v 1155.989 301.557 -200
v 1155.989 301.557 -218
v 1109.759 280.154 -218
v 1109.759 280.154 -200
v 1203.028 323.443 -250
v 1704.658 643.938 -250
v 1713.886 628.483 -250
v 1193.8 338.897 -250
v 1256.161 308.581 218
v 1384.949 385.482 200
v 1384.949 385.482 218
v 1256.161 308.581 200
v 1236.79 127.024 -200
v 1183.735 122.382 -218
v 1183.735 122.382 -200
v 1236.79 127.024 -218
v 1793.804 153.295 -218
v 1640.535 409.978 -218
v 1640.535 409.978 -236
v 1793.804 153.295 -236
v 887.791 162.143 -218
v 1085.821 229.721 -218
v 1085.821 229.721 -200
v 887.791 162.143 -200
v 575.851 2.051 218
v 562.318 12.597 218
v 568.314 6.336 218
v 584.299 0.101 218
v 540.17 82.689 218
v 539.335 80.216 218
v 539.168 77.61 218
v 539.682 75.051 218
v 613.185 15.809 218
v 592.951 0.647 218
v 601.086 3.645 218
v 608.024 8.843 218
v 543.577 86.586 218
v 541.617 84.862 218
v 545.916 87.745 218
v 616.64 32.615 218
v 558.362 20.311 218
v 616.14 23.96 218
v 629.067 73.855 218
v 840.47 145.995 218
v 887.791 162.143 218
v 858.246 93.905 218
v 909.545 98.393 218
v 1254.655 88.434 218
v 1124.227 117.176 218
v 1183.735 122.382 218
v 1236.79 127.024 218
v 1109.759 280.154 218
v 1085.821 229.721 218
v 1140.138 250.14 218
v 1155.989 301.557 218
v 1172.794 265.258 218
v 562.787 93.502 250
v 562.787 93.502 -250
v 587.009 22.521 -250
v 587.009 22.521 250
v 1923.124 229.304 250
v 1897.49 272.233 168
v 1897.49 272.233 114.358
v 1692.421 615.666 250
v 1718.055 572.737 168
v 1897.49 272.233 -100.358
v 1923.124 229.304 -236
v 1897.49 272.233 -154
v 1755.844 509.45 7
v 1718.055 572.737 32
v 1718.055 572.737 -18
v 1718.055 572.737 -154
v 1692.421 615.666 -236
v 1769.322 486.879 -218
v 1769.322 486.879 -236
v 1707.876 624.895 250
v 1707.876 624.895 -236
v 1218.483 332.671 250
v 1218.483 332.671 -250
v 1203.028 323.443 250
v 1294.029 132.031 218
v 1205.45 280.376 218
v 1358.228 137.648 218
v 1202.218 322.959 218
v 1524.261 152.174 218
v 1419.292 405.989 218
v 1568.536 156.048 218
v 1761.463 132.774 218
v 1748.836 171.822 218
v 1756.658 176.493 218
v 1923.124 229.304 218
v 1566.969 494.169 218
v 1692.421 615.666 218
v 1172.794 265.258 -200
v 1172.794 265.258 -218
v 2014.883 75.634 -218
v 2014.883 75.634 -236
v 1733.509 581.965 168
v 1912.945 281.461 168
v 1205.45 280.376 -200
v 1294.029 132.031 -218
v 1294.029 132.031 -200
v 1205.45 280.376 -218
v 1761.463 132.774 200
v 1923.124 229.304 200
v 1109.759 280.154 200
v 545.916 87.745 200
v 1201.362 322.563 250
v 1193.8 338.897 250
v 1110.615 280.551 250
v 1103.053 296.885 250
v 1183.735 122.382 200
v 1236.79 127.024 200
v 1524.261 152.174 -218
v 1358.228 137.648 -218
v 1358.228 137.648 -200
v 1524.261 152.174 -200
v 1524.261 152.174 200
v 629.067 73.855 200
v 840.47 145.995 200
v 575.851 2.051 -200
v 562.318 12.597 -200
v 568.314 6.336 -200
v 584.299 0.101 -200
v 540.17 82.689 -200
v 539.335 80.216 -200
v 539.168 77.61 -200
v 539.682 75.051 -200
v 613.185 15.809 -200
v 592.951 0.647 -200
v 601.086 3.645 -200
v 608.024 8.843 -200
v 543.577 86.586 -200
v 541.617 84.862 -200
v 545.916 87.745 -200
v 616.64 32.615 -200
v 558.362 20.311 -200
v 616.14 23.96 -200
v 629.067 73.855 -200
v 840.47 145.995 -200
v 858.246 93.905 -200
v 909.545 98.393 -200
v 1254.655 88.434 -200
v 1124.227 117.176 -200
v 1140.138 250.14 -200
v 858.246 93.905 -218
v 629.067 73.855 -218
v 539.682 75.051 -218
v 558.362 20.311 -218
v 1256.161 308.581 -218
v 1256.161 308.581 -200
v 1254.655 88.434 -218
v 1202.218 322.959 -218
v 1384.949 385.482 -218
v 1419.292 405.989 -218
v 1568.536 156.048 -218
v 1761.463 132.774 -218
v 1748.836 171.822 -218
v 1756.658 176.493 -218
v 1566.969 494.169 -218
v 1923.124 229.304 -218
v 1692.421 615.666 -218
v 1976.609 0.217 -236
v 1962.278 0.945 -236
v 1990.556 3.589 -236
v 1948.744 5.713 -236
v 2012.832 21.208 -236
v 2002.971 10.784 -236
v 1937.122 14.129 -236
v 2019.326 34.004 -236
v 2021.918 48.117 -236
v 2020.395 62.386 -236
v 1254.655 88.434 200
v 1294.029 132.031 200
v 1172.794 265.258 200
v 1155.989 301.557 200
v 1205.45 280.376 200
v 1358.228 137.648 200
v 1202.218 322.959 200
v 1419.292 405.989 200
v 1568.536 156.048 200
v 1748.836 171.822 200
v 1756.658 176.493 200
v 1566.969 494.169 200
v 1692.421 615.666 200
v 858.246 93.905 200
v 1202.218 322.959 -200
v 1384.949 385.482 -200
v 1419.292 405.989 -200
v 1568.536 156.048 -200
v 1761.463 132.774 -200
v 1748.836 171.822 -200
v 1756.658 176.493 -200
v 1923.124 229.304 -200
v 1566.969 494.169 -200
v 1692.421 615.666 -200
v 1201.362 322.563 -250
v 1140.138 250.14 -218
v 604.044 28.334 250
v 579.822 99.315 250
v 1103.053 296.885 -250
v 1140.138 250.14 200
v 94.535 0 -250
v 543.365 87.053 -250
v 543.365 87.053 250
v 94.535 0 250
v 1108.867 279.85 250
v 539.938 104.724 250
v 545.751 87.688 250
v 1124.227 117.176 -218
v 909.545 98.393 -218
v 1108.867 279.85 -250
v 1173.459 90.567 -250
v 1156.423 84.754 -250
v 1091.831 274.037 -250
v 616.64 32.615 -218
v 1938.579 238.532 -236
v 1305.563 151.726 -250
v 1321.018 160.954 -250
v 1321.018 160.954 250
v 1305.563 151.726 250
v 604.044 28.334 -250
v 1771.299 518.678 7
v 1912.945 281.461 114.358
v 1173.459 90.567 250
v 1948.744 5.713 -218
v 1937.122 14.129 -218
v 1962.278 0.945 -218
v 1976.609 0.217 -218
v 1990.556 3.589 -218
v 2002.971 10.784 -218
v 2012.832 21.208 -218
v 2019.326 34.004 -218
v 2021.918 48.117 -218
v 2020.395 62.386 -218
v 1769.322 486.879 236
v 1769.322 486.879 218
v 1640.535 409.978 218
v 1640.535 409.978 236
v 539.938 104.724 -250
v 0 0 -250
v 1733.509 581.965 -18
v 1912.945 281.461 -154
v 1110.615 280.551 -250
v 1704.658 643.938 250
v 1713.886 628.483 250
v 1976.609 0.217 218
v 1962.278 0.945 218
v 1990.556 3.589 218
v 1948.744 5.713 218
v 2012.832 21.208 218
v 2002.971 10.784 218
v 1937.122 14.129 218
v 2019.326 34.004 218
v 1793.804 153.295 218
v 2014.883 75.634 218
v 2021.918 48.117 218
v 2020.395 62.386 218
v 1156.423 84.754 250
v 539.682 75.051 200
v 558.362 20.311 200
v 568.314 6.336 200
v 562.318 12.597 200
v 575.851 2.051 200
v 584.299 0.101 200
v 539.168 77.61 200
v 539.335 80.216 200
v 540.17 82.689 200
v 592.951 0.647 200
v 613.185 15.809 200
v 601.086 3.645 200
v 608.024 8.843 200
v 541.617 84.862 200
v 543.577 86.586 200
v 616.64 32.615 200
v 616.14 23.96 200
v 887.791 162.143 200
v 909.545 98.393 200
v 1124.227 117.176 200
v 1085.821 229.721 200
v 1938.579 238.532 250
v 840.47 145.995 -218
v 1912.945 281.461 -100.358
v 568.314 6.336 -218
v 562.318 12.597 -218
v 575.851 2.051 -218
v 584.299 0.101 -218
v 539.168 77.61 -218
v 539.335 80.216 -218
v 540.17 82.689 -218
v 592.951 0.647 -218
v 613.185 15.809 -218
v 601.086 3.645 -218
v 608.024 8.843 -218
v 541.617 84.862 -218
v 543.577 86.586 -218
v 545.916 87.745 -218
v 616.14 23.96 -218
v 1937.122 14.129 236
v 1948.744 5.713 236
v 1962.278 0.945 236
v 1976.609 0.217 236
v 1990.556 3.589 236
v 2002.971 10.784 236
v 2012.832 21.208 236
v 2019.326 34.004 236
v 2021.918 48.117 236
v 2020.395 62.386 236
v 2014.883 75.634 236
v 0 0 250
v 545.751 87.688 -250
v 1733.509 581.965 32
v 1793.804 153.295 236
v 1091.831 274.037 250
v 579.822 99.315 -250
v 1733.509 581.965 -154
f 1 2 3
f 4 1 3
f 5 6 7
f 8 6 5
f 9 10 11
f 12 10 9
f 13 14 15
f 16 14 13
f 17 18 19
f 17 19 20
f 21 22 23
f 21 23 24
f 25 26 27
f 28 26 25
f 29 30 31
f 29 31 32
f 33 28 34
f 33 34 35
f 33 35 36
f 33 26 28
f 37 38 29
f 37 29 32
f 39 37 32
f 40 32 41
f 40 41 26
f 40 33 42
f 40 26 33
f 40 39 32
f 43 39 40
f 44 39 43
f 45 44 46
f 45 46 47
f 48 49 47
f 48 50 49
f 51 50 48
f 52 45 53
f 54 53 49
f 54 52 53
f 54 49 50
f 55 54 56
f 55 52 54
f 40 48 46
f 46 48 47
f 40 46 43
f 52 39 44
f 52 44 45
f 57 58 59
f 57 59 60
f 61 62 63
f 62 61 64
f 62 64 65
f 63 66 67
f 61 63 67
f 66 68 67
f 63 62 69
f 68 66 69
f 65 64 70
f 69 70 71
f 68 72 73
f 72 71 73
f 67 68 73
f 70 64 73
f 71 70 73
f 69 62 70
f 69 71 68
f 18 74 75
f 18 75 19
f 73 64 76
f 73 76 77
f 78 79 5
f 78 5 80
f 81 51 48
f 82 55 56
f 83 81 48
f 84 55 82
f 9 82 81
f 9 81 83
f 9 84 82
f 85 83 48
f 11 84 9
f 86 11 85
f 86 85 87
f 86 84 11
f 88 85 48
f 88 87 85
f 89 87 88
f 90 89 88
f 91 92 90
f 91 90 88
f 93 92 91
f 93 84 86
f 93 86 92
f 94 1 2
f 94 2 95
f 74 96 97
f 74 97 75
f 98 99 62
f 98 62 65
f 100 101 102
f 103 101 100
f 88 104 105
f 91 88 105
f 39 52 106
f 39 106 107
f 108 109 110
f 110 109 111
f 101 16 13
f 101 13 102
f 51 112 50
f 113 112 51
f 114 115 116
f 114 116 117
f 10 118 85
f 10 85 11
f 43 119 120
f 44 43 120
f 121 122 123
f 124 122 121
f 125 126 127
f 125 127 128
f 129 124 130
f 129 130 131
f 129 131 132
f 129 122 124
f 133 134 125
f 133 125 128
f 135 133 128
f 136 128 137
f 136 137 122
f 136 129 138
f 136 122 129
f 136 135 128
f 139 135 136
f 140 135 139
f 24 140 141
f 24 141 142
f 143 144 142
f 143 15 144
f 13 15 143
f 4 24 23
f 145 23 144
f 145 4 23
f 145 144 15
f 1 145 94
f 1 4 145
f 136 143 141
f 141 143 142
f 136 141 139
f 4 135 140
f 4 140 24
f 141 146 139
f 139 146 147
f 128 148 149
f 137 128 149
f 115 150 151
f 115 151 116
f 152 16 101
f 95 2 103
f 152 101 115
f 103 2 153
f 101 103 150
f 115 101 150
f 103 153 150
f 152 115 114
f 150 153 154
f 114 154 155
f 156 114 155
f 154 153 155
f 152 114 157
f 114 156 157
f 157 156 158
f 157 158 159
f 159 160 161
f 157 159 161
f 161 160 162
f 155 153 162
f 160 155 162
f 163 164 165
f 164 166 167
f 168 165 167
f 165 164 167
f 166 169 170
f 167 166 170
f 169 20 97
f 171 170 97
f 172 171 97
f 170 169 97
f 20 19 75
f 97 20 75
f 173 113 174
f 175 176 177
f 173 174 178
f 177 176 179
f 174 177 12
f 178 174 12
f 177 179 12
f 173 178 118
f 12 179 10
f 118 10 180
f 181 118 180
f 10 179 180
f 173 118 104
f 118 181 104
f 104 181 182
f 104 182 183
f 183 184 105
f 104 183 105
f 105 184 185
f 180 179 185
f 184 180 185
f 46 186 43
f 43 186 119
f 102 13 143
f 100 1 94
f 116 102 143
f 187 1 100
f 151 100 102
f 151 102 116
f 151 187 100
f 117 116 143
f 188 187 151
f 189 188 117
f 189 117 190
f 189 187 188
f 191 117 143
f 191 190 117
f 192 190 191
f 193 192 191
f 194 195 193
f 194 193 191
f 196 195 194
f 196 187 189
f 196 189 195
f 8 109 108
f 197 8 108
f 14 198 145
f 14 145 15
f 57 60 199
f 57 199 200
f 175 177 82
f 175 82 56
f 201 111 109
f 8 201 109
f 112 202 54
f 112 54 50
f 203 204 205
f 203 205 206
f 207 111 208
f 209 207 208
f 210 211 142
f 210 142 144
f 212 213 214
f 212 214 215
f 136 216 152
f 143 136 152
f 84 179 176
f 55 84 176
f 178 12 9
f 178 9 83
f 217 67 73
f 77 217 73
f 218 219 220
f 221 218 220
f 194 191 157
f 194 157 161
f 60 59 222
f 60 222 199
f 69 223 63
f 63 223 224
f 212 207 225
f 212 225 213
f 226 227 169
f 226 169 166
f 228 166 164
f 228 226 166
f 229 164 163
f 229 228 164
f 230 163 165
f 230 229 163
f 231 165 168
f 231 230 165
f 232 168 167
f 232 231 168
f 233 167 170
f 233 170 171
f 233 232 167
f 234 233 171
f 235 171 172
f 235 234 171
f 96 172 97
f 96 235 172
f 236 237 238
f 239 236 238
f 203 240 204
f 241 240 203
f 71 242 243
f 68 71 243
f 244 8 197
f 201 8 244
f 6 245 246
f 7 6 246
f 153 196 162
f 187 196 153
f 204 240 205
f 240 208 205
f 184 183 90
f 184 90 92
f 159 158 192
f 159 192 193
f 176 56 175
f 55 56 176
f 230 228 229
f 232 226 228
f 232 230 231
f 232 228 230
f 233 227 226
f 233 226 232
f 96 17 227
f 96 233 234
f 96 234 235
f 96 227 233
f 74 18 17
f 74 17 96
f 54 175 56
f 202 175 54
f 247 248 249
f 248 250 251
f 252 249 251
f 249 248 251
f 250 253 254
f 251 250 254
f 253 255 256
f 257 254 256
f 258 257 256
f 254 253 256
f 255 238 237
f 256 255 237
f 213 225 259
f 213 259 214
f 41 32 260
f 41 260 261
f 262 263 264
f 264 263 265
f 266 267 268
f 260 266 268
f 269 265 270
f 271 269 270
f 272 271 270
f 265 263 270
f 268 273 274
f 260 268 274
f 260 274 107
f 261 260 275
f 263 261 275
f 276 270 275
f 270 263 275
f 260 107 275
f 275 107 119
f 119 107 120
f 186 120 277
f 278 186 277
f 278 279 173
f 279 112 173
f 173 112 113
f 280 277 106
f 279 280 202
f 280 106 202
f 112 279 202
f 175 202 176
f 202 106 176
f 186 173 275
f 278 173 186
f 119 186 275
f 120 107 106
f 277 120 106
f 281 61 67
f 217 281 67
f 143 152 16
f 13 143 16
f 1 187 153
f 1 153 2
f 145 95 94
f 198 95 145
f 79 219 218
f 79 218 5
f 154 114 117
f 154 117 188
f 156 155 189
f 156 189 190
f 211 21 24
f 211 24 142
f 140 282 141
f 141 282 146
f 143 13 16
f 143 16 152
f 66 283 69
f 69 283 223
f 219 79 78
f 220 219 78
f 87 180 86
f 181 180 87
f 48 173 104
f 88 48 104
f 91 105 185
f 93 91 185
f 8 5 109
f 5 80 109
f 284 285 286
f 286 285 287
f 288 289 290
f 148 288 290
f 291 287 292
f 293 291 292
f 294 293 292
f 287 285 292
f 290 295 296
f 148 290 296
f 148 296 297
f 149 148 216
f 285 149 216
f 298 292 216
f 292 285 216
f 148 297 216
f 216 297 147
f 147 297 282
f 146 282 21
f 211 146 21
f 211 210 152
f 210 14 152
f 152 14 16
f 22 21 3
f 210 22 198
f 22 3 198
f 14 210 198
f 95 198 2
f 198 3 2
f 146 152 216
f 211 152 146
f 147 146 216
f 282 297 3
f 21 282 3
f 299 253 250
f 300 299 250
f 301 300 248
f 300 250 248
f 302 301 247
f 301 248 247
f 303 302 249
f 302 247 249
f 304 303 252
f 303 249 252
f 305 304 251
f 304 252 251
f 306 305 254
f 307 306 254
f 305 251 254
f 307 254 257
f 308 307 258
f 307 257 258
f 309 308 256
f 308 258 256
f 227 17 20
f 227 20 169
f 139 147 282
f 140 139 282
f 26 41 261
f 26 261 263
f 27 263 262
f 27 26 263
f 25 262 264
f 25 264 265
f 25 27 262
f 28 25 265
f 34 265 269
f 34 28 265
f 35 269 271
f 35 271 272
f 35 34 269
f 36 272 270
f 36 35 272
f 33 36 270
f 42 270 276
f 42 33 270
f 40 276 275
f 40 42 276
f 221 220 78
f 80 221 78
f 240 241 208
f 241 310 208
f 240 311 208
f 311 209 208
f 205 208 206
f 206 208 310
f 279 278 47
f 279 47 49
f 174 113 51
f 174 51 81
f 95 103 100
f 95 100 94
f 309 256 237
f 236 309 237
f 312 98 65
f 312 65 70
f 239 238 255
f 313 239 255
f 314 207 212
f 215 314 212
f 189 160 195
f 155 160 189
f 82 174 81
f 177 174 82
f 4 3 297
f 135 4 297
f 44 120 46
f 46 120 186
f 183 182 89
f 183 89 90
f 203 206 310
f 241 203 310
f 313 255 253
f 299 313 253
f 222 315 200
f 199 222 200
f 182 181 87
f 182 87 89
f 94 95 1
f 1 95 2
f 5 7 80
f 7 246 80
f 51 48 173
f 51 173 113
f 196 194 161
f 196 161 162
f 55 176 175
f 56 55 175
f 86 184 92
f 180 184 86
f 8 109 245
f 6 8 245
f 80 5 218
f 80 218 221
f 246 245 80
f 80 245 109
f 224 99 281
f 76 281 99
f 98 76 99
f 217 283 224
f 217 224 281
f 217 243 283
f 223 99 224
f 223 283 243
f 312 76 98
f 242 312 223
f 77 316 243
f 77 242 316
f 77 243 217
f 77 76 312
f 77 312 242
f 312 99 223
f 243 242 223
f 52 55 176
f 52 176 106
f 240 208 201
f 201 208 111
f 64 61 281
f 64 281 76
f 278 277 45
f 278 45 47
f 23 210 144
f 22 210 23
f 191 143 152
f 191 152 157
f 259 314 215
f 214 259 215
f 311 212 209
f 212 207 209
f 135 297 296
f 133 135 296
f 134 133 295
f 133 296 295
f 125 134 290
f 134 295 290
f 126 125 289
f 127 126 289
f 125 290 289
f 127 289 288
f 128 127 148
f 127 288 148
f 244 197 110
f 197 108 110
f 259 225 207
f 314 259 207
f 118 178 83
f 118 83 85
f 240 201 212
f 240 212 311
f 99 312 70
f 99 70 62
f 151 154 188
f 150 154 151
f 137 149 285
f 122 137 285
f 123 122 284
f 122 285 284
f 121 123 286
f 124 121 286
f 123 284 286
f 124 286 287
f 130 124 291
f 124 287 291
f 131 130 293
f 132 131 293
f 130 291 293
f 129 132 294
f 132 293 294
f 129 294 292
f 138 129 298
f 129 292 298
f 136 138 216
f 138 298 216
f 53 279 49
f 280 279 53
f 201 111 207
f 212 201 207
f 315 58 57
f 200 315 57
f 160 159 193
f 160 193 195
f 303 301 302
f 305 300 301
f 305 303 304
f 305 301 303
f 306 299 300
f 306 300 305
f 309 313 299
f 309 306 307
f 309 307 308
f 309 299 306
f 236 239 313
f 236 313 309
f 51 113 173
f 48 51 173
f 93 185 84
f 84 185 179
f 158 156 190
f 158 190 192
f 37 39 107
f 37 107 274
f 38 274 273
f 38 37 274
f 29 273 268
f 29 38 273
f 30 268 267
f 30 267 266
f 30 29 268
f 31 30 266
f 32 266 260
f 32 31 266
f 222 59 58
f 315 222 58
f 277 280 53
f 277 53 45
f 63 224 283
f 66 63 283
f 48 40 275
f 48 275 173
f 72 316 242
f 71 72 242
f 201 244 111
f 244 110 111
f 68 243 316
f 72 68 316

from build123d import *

# Parameters (mm, degrees)
BOSS_EXTRUDE1_DEPTH     = 250
BOSS_EXTRUDE1_2_DEPTH   = 250
BOSS_EXTRUDE1_3_DEPTH   = 250
BOSS_EXTRUDE1_4_DEPTH   = 250
BOSS_EXTRUDE2_START     = 200
BOSS_EXTRUDE2_DEPTH     = 18
BOSS_EXTRUDE8_START     = 218
BOSS_EXTRUDE8_DEPTH     = 18
BOSS_EXTRUDE3_DEPTH     = 18
SKETCH10_W              = 486
SKETCH10_H              = 450
BOSS_EXTRUDE4_DEPTH     = 18
SKETCH18_W              = 500
SKETCH18_H              = 200
BOSS_EXTRUDE9_DEPTH     = 18
SKETCH19_W              = 500
SKETCH19_H              = 200
BOSS_EXTRUDE10_DEPTH    = 18
SKETCH20_W              = 500
SKETCH20_H              = 75
BOSS_EXTRUDE11_DEPTH    = 18
CUT_EXTRUDE2_DEPTH      = 18
CUT_EXTRUDE3_DEPTH      = 2174.010915016
CUT_EXTRUDE3_DEPTH_BACK = 2174.010915016


with BuildPart() as part:
    # Sketch6 → Boss-Extrude1 (new, symmetric)
    with BuildSketch(Plane.XY):
        Polygon((94.53452545, 0), (0, 0), (539.937920842, 104.723644117), (543.365240104, 87.052948526), align=None)
    extrude(amount=BOSS_EXTRUDE1_DEPTH, both=True)


with BuildPart() as body_2:
    # Sketch6 → Boss-Extrude1 2 (new, symmetric)
    with BuildSketch(Plane.XY):
        Polygon((1103.053289344, 296.885247349), (1108.866581543, 279.849824436), (545.75121304, 87.688221205), (539.937920842, 104.723644117), align=None)
    extrude(amount=BOSS_EXTRUDE1_2_DEPTH, both=True)


with BuildPart() as body_3:
    # Sketch6 → Boss-Extrude1 3 (new, symmetric)
    with BuildSketch(Plane.XY):
        Polygon((1193.800214808, 338.897097092), (1201.362347762, 322.562650509), (1110.615422298, 280.550800765), (1103.053289344, 296.885247349), align=None)
    extrude(amount=BOSS_EXTRUDE1_3_DEPTH, both=True)


with BuildPart() as body_4:
    # Sketch6 → Boss-Extrude1 4 (new, symmetric)
    with BuildSketch(Plane.XY):
        Polygon((1704.657517606, 643.937776637), (1713.885639004, 628.483269998), (1203.028336206, 323.442590453), (1193.800214808, 338.897097092), align=None)
    extrude(amount=BOSS_EXTRUDE1_4_DEPTH, both=True)


with BuildPart() as body_5:
    # Sketch8 → Boss-Extrude2 (new body)
    with BuildSketch(Plane.XY.offset(BOSS_EXTRUDE2_START)):
        Polygon((1692.42104645, 615.666434723), (1202.218399833, 322.958965104), (1155.98888503, 301.556725637), (1254.655454355, 88.433812293), (1761.463497139, 132.773770621), (1923.1240814, 229.303768741), align=None)
    extrude(amount=BOSS_EXTRUDE2_DEPTH)


with BuildPart() as body_6:
    # Sketch17 → Boss-Extrude8 (new body)
    with BuildSketch(Plane.XY.offset(BOSS_EXTRUDE8_START)):
        with BuildLine():
            Line((1254.655454355, 88.433812293), (1155.98888503, 301.556725637))
            Line((1155.98888503, 301.556725637), (1109.759370227, 280.15448617))
            Line((1109.759370227, 280.15448617), (545.916310922, 87.744560412))
            ThreePointArc((545.916310922, 87.744560412), (540.170094701, 82.688905865), (539.681793859, 75.050829795))
            Line((539.681793859, 75.050829795), (558.36155207, 20.311179669))
            ThreePointArc((558.36155207, 20.311179669), (592.950825668, 0.647003481), (616.639764534, 32.614672282))
            Line((616.639764534, 32.614672282), (1254.655454355, 88.433812293))
        make_face()
    extrude(amount=-BOSS_EXTRUDE8_DEPTH)


with BuildPart() as body_7:
    # Sketch9 → Boss-Extrude3 (new body)
    with BuildSketch(Plane.XY.offset(218)):
        with BuildLine():
            Line((1769.3220581, 486.878879395), (1640.534502772, 409.977867745))
            Line((1640.534502772, 409.977867745), (1793.80385908, 153.294824416))
            Line((1793.80385908, 153.294824416), (1937.121726961, 14.128884896))
            ThreePointArc((1937.121726961, 14.128884896), (2002.971407437, 10.78394543), (2014.882838534, 75.63367055))
            Line((2014.882838534, 75.63367055), (1769.3220581, 486.878879395))
        make_face()
    extrude(amount=BOSS_EXTRUDE3_DEPTH)


with BuildPart() as body_8:
    # Mirror1: mirrored copy
    add(body_7.part.mirror(Plane.XY))


with BuildPart() as body_9:
    # Mirror1 2: mirrored copy
    add(body_5.part.mirror(Plane.XY))


with BuildPart() as body_10:
    # Mirror1 3: mirrored copy
    add(body_6.part.mirror(Plane.XY))


with BuildPart() as body_11:
    # Sketch10 → Boss-Extrude4 (new body)
    with BuildSketch(Plane(origin=(1518.594971798, 906.776196822, 0), x_dir=(0, 0, -1), z_dir=(0.8585837021828359, 0.5126734109996494, 0))):
        with Locations((-7, -564.058103897)):
            Rectangle(SKETCH10_W, SKETCH10_H)
    extrude(amount=BOSS_EXTRUDE4_DEPTH)

    # Sketch21 → Cut-Extrude2 (cut)
    with BuildSketch(Plane(origin=(1534.049478437, 916.00431822, 0), x_dir=(0, 0, -1), z_dir=(0.858583702182836, 0.5126734109996494, 0))):
        Polygon((-168, -389.058103897), (-32, -389.058103897), (-168, -739.058103897), align=None)
        Polygon((154, -739.058103897), (154, -389.058103897), (18, -389.058103897), align=None)
        Polygon((-114.357951309, -739.058103897), (100.357951309, -739.058103897), (-7, -462.769258616), align=None)
    extrude(amount=-CUT_EXTRUDE2_DEPTH, mode=Mode.SUBTRACT)


with BuildPart() as body_12:
    # Sketch18 → Boss-Extrude9 (new body)
    with BuildSketch(Plane(origin=(1044.656768193, 623.78047395, 0), x_dir=(0, 0, 1), z_dir=(-0.8585837021828362, -0.5126734109996488, 0))):
        with Locations((0, -439.058103897)):
            Rectangle(SKETCH18_W, SKETCH18_H)
    extrude(amount=BOSS_EXTRUDE9_DEPTH)


with BuildPart() as body_13:
    # Sketch19 → Boss-Extrude10 (new body)
    with BuildSketch(Plane(origin=(1078.745019921, 368.11883337, 0), x_dir=(0, 0, -1), z_dir=(0.9464123840375391, 0.3229606776999047, 0))):
        with Locations((0, -193.266963137)):
            Rectangle(SKETCH19_W, SKETCH19_H)
    extrude(amount=-BOSS_EXTRUDE10_DEPTH)


with BuildPart() as body_14:
    # Sketch20 → Boss-Extrude11 (new body)
    with BuildSketch(Plane(origin=(532.665074331, 181.770522337, 0), x_dir=(0, 0, 1), z_dir=(-0.946412384037533, -0.32296067769992237, 0))):
        with Locations((0, -130.766963137)):
            Rectangle(SKETCH20_W, SKETCH20_H)
    extrude(amount=-BOSS_EXTRUDE11_DEPTH)


with BuildPart() as cut_extrude3_tool:
    # Sketch22 → Cut-Extrude3 (new, two sides: drawn at the far end of the back side and taken through both)
    with BuildSketch(Plane.XY.offset(218).offset(-CUT_EXTRUDE3_DEPTH_BACK)):
        Polygon((840.470295916, 145.995440835), (858.245927781, 93.905266106), (629.067286371, 73.854733061), align=None)
        Polygon((887.790915118, 162.14347472), (909.545458676, 98.393393504), (1124.227091567, 117.175602649), (1085.821338057, 229.720823322), align=None)
        Polygon((1140.137545177, 250.139621594), (1183.734547405, 122.38183043), (1294.02874481, 132.031322356), (1205.449704677, 280.376289309), align=None)
        Polygon((1358.228032594, 137.648032243), (1524.260673415, 152.17400609), (1384.949008656, 385.481843634), (1256.161453329, 308.580831984), align=None)
        Polygon((1566.968753519, 494.168606766), (1419.292356743, 405.988780074), (1568.536044301, 156.047599116), (1748.835508068, 171.821758236), (1756.657915589, 176.492636958), align=None)
    extrude(amount=CUT_EXTRUDE3_DEPTH + CUT_EXTRUDE3_DEPTH_BACK)


with BuildPart() as body_5_1:
    add(body_5.part)

    # Cut-Extrude3: cut by cut_extrude3_tool
    add(cut_extrude3_tool.part, mode=Mode.SUBTRACT)


with BuildPart() as body_6_1:
    add(body_6.part)

    # Cut-Extrude3: cut by cut_extrude3_tool
    add(cut_extrude3_tool.part, mode=Mode.SUBTRACT)


with BuildPart() as body_9_1:
    add(body_9.part)

    # Cut-Extrude3: cut by cut_extrude3_tool
    add(cut_extrude3_tool.part, mode=Mode.SUBTRACT)


with BuildPart() as body_10_1:
    add(body_10.part)

    # Cut-Extrude3: cut by cut_extrude3_tool
    add(cut_extrude3_tool.part, mode=Mode.SUBTRACT)


solid = Compound([part.part, body_2.part, body_3.part, body_4.part, body_7.part, body_8.part, body_11.part, body_12.part, body_13.part, body_14.part, body_5_1.part, body_6_1.part, body_9_1.part, body_10_1.part])
